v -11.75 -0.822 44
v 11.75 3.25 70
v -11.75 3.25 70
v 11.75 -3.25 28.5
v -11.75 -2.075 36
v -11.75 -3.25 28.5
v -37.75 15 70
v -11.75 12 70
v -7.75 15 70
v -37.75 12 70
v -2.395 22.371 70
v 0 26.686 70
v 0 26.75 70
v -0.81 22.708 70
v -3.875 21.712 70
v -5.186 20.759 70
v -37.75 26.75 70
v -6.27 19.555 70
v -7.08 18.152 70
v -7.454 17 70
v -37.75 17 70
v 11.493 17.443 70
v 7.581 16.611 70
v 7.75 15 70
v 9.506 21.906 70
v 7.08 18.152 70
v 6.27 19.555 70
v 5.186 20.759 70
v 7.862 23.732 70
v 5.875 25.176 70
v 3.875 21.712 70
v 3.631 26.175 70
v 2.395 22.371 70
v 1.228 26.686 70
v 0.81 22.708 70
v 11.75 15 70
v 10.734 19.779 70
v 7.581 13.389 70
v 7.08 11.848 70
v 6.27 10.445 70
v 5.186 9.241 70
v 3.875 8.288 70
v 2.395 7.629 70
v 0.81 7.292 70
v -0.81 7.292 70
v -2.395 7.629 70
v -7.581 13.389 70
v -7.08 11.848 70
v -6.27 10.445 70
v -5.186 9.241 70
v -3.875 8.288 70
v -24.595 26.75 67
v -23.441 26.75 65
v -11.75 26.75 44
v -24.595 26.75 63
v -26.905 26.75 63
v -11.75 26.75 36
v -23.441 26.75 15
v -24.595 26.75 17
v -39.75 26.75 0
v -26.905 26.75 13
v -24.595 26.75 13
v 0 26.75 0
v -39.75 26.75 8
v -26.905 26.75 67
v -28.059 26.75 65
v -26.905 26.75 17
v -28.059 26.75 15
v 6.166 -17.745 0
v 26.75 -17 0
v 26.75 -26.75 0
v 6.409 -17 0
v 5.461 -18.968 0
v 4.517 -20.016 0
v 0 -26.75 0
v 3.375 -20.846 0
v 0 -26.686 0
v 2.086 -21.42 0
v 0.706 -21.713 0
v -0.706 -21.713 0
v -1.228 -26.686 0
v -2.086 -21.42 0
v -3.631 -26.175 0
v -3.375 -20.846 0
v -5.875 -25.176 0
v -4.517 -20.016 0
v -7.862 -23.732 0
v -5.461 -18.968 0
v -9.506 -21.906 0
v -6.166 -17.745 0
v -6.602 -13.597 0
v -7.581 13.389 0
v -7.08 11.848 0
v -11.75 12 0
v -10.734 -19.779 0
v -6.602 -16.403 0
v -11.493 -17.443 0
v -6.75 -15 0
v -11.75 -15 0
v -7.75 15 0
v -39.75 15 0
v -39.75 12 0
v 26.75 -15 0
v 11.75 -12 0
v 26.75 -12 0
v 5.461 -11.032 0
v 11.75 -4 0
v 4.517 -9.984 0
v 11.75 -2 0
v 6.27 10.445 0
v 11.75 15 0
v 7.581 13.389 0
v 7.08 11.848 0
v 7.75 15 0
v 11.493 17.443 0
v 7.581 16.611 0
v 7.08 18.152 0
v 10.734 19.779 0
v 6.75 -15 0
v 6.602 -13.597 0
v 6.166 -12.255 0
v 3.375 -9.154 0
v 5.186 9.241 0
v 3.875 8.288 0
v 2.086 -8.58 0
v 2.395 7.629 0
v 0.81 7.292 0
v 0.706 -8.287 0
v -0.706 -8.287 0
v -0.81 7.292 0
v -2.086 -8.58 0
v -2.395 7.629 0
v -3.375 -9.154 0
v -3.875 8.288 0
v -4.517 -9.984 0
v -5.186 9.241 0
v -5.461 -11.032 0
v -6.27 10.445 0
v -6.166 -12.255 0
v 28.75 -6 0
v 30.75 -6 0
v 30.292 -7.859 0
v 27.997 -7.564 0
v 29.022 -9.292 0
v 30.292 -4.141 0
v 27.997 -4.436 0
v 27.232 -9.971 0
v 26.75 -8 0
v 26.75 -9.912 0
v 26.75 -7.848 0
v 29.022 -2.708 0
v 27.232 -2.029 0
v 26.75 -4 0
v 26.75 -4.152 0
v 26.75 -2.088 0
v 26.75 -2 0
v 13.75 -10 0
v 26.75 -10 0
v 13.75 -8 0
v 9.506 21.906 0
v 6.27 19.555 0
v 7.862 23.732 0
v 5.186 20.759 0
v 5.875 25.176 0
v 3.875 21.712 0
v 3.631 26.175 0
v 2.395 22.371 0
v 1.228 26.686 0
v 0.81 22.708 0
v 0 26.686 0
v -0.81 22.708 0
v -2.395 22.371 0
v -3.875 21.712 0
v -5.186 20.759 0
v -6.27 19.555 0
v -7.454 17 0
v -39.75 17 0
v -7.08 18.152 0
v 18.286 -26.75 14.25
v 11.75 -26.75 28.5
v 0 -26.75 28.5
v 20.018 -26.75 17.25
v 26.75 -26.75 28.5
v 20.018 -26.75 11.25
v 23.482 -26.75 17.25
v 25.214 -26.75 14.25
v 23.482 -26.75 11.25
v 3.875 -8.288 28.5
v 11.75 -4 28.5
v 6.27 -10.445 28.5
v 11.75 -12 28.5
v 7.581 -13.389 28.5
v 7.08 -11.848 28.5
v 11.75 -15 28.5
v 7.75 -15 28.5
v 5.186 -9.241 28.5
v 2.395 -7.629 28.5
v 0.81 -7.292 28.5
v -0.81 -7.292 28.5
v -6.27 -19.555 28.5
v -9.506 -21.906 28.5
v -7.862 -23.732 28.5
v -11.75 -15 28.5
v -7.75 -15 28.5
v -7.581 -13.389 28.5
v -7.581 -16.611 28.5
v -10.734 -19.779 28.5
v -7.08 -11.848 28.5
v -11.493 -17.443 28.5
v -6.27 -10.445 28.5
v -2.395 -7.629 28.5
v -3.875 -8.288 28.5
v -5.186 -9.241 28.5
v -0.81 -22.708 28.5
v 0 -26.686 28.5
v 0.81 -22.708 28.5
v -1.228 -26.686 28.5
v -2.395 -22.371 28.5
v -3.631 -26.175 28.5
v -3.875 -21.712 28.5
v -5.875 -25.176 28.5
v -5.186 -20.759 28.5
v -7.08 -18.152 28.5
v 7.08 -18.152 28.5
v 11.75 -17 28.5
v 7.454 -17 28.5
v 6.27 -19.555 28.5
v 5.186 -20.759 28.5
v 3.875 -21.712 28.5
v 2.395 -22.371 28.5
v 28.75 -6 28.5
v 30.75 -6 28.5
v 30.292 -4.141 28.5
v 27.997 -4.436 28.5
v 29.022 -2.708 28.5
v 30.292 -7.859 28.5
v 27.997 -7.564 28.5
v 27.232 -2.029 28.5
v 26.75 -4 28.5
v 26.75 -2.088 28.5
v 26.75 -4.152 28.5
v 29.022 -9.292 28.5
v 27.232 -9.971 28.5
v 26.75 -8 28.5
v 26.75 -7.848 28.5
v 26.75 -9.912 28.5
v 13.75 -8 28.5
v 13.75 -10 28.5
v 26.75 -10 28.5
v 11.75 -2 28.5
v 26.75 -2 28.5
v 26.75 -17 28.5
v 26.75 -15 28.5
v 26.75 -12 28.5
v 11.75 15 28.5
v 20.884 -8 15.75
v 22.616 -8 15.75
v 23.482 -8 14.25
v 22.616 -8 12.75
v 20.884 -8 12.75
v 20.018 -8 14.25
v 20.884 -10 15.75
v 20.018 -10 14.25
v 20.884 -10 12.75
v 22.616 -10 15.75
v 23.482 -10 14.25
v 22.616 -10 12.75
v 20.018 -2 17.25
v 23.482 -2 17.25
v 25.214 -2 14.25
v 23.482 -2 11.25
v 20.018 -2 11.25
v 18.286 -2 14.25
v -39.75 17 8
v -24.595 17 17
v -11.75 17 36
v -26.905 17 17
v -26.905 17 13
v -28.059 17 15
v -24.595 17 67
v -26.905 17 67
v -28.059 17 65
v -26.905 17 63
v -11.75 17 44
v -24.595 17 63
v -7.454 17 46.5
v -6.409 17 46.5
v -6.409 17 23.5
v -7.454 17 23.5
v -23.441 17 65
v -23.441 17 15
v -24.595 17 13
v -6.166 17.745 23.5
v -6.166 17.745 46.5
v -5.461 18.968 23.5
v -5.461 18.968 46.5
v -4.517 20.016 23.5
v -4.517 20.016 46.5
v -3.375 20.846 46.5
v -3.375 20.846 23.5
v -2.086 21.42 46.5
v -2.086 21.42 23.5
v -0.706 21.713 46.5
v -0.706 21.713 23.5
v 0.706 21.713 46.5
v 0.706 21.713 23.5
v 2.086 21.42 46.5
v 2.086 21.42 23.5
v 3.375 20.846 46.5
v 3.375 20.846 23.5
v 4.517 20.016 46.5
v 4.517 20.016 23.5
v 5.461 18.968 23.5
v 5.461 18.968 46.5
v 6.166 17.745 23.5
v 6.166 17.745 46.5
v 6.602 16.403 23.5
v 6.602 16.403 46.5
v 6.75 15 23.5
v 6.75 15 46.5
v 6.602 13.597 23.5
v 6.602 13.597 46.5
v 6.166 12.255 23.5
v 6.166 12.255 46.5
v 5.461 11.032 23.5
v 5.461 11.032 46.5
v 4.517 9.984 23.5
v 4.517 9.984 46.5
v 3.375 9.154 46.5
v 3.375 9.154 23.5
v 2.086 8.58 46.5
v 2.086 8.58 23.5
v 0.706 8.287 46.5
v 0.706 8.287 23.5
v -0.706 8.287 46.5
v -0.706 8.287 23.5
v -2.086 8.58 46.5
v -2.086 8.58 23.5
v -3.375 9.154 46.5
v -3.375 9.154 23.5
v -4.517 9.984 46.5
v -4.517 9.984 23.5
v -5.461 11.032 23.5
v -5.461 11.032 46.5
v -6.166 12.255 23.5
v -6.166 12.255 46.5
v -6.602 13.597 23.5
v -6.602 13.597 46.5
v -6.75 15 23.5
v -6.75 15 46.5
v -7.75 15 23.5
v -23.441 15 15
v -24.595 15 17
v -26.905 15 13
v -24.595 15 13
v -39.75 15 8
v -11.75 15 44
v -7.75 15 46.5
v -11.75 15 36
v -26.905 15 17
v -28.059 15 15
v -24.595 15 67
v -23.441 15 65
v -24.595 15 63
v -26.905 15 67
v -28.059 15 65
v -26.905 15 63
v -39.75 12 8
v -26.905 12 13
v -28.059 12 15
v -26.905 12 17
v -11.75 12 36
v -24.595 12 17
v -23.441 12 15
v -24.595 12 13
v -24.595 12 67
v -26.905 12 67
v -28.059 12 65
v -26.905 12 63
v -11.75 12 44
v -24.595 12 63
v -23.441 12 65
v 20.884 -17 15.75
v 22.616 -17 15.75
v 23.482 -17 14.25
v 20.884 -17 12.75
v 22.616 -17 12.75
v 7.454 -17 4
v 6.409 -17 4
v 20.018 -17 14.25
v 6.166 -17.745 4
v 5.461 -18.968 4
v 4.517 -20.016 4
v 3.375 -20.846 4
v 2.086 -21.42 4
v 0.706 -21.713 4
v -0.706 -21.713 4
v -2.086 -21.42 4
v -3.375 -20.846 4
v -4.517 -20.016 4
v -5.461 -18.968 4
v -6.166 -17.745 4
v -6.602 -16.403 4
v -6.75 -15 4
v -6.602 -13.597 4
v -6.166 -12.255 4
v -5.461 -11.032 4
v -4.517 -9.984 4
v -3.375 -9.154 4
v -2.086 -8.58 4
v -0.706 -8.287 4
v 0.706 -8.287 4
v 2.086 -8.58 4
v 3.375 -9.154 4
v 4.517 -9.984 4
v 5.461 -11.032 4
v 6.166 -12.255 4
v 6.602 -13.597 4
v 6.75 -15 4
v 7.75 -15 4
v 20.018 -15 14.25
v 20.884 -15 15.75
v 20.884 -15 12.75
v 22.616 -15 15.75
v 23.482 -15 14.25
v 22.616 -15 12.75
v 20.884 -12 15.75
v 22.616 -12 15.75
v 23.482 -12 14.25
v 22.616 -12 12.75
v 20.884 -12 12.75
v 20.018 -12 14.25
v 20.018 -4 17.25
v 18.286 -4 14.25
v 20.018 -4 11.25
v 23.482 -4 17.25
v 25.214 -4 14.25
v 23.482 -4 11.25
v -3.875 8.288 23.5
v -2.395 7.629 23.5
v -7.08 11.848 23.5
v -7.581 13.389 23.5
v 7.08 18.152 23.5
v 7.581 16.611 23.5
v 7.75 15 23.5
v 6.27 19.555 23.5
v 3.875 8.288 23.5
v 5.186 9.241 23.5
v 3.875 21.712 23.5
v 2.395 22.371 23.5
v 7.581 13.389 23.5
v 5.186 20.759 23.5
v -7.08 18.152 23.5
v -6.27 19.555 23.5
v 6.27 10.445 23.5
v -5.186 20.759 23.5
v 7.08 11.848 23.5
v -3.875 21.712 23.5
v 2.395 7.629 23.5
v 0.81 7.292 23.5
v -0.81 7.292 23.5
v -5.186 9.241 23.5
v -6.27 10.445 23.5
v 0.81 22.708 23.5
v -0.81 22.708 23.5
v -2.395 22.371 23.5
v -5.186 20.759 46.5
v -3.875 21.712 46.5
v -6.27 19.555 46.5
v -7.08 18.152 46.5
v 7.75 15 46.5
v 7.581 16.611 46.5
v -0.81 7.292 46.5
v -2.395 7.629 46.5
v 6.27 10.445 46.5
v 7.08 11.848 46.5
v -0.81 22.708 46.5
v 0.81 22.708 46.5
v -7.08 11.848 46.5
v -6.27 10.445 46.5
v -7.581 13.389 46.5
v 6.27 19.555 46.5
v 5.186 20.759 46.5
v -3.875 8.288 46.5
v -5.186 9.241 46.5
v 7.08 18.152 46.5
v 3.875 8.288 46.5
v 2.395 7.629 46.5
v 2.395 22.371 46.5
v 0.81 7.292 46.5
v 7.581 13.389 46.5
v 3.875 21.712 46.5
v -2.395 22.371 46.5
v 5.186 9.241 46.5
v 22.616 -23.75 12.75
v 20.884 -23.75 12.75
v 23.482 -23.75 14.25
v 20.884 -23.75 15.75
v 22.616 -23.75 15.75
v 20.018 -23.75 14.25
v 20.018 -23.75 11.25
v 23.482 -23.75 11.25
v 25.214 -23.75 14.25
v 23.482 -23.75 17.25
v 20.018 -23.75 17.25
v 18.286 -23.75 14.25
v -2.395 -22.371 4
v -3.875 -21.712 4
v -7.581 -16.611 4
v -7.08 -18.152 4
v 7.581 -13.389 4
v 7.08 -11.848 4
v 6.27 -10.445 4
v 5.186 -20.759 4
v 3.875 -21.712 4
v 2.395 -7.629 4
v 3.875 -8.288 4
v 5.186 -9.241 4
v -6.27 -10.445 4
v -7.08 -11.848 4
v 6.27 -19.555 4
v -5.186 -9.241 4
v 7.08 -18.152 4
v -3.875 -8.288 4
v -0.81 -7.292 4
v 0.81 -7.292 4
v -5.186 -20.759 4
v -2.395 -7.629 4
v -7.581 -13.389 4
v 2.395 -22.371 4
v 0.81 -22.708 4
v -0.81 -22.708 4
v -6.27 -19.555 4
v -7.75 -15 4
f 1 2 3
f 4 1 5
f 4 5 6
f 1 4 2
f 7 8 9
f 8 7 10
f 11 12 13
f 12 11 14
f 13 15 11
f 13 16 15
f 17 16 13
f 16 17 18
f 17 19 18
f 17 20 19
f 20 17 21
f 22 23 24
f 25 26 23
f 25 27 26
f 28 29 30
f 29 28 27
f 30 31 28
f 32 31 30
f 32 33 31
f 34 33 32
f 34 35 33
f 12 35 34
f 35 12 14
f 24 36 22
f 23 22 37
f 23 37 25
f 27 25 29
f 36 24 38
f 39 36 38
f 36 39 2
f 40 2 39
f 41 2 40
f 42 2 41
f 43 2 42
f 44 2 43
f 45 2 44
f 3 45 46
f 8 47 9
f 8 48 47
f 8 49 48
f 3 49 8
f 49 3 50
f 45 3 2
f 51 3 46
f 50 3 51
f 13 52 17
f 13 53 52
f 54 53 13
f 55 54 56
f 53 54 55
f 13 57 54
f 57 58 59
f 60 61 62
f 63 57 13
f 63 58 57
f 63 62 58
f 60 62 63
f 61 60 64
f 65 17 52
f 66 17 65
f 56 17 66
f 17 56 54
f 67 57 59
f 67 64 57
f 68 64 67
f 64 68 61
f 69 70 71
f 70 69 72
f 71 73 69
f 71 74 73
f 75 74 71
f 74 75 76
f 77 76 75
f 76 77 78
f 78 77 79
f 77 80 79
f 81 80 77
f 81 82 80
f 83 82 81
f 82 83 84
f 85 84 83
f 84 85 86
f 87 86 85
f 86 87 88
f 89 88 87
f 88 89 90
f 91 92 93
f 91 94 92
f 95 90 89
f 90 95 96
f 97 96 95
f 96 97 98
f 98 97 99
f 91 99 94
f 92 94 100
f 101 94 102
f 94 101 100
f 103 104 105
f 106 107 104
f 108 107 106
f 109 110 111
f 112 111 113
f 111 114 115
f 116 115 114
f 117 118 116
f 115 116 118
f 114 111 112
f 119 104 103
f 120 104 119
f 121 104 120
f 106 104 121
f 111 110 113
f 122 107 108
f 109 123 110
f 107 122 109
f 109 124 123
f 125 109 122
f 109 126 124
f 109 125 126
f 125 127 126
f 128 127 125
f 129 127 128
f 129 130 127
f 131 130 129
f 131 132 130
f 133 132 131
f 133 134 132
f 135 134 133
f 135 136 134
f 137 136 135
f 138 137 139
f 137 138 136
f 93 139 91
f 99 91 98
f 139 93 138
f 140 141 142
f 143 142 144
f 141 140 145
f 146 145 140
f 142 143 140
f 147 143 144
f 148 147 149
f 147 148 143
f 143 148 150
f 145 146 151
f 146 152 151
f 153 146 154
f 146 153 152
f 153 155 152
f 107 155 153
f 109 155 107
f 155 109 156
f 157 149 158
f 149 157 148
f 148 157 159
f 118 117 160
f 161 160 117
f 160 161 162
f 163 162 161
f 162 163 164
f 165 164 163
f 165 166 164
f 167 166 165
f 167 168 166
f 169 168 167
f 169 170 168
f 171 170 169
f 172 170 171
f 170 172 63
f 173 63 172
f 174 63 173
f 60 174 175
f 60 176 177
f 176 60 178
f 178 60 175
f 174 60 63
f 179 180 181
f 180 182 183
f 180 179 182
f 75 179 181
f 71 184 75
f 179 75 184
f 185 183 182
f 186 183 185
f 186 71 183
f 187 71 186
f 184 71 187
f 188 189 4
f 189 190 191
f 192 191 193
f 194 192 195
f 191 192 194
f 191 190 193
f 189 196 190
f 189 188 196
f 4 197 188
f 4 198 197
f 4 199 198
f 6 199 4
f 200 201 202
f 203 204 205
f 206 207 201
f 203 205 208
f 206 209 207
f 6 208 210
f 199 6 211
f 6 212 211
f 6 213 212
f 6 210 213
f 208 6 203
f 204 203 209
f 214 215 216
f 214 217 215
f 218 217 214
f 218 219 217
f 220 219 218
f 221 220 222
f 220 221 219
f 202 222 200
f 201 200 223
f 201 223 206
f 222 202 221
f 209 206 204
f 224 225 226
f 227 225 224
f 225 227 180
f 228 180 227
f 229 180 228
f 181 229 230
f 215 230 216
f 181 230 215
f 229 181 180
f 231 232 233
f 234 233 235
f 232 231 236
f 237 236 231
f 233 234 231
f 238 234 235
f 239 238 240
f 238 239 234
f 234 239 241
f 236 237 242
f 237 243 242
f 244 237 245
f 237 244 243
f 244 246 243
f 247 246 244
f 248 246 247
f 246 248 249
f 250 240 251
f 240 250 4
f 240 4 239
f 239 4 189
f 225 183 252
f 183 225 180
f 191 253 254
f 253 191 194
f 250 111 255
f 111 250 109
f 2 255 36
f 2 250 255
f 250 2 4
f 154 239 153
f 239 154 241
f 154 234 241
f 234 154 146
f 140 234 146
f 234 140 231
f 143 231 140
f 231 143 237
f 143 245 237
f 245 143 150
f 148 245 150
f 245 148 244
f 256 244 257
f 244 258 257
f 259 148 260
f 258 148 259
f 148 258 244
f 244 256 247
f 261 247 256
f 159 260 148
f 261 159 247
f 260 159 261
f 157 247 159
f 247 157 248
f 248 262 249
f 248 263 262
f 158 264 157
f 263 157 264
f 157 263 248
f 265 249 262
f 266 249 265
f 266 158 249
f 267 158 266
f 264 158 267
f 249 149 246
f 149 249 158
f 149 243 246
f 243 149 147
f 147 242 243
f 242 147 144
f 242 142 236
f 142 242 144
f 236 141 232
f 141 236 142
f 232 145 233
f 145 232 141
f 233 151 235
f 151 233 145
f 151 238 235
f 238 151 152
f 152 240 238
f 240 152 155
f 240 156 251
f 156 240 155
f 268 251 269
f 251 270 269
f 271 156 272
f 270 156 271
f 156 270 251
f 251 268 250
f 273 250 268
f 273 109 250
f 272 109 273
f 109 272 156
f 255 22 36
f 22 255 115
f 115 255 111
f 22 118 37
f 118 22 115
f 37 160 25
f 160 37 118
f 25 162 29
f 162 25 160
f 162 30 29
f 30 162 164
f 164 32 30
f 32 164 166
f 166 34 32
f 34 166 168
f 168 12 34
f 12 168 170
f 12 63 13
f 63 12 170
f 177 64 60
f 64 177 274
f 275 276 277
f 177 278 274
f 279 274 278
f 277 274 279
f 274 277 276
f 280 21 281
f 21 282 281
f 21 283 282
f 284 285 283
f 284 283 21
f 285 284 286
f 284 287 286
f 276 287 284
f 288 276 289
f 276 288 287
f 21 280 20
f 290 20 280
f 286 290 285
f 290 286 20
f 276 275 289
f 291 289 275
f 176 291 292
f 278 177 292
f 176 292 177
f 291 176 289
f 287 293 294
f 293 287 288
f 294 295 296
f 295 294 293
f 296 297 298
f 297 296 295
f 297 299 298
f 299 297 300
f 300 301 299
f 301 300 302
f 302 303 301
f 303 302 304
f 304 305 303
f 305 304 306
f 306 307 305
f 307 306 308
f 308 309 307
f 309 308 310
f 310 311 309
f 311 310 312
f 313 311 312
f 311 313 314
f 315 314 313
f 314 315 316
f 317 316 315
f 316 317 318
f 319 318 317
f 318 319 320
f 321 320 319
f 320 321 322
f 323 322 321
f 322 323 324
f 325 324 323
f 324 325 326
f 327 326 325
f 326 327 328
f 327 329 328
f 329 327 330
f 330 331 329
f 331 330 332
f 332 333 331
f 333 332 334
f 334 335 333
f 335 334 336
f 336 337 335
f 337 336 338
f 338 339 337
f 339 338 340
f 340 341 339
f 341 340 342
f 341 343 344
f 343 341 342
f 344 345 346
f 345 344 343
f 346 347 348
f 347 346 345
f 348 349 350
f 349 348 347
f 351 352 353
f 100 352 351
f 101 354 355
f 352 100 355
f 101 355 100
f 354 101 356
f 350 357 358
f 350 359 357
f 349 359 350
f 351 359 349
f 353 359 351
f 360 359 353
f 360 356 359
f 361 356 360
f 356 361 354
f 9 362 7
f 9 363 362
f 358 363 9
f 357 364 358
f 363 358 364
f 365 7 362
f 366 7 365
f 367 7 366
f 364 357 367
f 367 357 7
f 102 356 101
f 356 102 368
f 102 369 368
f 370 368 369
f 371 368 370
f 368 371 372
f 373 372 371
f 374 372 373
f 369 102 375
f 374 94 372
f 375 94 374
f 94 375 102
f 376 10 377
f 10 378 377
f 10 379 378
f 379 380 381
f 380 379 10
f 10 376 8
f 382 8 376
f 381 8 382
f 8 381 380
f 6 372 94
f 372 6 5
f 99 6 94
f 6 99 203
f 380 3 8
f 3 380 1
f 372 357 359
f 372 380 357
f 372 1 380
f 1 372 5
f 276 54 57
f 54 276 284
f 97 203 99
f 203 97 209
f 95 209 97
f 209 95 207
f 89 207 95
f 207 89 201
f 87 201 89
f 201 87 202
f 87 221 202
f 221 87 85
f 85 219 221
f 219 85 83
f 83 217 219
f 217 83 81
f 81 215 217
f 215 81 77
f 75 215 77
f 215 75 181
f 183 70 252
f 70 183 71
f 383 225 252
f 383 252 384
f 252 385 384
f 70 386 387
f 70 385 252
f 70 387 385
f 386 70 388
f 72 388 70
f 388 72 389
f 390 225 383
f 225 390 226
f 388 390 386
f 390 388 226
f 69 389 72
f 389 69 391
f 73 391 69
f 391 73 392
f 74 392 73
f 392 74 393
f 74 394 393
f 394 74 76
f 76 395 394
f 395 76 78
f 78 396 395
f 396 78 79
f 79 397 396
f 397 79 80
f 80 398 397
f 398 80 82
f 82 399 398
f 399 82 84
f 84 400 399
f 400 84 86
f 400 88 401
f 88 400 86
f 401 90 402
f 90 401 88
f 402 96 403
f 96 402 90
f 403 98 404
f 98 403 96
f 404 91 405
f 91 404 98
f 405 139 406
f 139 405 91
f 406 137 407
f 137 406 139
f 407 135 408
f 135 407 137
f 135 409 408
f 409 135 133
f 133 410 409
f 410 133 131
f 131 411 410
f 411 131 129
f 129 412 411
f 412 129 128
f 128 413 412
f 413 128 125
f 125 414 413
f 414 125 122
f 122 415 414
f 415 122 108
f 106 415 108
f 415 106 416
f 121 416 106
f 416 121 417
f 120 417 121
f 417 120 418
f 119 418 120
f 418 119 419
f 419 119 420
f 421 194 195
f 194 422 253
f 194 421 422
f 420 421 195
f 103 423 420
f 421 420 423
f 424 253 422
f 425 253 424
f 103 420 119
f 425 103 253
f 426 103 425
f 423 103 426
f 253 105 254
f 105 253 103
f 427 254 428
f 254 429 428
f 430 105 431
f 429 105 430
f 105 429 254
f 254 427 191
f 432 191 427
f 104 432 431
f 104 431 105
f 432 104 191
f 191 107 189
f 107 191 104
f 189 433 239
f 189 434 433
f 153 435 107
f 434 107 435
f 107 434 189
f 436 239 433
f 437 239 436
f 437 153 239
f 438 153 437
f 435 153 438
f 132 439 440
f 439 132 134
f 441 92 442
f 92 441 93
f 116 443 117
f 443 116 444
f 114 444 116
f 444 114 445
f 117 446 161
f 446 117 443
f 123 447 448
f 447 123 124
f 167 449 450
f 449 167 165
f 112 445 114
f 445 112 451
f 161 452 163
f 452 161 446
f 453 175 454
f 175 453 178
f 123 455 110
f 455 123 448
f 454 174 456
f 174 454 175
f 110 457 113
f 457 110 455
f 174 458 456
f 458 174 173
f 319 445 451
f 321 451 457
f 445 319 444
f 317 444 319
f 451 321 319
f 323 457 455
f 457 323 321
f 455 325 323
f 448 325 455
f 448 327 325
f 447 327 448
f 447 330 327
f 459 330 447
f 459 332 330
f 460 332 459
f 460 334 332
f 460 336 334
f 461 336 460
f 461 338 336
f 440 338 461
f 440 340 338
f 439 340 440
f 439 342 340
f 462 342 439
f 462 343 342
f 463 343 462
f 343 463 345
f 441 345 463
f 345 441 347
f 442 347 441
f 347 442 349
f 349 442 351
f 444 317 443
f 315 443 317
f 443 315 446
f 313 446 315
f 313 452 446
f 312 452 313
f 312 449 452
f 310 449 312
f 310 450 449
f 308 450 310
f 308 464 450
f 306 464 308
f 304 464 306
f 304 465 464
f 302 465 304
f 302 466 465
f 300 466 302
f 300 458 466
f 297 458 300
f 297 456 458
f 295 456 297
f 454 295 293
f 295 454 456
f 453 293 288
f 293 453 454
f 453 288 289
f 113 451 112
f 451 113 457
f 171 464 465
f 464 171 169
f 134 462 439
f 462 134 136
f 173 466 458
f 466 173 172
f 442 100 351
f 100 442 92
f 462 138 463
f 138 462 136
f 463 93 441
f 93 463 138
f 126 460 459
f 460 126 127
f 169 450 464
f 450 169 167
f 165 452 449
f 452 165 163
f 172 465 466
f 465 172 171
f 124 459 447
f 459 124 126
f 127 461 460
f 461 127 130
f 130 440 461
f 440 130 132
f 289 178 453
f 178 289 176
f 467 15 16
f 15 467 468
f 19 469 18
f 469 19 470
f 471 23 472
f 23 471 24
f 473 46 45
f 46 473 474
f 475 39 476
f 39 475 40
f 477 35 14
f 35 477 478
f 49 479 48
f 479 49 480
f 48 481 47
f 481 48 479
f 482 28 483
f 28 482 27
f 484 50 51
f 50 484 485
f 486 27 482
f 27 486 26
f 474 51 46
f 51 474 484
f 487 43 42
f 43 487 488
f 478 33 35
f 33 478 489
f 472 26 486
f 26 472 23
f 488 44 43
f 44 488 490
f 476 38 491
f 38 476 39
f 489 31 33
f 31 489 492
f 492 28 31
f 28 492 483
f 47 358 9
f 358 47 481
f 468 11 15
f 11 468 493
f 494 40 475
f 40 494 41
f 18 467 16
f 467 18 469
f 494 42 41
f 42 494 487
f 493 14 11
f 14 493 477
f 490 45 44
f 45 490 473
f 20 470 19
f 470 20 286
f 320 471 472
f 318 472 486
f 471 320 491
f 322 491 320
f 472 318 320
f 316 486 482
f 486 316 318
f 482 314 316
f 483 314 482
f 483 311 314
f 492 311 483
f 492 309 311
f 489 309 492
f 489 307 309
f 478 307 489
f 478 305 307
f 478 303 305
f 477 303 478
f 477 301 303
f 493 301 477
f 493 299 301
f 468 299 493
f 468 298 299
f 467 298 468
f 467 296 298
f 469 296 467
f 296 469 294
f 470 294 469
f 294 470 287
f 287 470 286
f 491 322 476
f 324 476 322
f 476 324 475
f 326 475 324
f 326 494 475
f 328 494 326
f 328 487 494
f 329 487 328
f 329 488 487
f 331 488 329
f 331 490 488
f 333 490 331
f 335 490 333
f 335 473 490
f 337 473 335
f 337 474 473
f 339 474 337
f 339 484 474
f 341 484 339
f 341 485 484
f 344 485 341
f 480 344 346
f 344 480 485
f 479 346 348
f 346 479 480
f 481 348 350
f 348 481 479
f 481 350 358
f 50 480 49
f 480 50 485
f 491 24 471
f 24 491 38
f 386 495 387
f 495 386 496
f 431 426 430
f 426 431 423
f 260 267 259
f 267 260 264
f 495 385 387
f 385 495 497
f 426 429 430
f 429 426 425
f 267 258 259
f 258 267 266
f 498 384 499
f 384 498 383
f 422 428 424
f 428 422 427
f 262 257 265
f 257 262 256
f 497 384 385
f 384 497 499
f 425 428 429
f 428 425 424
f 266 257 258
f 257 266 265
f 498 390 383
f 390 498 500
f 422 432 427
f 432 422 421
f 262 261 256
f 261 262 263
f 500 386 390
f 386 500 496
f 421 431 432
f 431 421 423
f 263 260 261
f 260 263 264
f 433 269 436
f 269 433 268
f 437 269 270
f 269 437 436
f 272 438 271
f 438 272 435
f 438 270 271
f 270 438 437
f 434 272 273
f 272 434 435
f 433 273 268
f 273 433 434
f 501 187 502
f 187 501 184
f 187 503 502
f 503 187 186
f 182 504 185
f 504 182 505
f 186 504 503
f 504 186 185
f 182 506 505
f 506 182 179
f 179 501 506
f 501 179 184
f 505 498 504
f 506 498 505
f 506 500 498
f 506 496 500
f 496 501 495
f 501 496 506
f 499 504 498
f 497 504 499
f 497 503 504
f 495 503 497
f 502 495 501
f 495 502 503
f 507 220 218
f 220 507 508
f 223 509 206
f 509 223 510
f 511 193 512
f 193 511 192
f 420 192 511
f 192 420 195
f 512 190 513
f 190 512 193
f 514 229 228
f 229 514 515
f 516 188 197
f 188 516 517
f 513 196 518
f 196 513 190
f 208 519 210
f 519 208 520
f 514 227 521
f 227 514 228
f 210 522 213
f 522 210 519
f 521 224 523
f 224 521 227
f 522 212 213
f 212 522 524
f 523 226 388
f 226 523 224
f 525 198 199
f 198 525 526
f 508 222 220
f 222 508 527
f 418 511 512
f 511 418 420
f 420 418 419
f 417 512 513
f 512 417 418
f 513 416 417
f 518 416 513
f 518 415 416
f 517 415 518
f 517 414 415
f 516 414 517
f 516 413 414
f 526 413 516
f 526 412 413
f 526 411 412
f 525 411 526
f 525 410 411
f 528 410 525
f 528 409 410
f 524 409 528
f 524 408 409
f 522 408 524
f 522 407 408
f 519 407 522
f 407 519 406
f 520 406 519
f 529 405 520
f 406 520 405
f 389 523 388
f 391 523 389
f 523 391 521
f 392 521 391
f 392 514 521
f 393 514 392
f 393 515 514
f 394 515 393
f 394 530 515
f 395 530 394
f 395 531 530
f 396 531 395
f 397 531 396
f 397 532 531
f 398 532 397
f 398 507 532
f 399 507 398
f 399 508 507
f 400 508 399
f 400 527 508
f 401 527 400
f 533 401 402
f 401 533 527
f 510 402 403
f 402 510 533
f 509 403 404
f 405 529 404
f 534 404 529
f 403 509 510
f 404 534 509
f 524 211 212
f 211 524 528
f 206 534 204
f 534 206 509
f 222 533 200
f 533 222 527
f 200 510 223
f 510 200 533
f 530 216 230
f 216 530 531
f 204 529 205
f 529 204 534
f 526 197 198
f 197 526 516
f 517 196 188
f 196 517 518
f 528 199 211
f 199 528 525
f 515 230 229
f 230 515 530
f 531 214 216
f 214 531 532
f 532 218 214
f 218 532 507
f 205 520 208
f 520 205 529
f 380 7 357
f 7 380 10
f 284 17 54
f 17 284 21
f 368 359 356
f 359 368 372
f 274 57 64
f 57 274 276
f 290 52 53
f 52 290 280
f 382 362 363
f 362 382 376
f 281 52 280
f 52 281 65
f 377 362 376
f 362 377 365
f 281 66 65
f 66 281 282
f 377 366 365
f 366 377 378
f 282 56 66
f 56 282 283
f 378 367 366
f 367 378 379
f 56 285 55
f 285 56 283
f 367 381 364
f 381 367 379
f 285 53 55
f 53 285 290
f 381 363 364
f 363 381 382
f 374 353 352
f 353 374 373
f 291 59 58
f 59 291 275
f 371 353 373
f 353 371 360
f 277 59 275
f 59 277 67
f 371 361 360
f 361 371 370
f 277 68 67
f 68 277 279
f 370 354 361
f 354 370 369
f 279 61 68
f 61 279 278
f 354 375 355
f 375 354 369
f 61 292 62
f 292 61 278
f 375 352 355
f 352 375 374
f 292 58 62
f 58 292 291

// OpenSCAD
// file: wallace.scad
rod_size = 8;
rod_nut_size = 15; //12 for M6, 15 for M8
bearing_size = 15.5; //12.5 for LM6UU, 15.5 for LM8UU,LM8SUU
bearing_length = 24.5; //19.5 for LM6UU, 17.5 for LM8SUU, 24.5 for LM8UU
yz_motor_distance = 25;
motor_screw_spacing = 31; //26 for NEMA14, 31 for NEMA17
motor_casing = 45; //38 for NEMA14, 45 for NEMA17
end_height = 55; //measure the height of your motor casing and add 4mm. Suggestion: 40 for NEMA14, 55 for NEMA17
bed_mount_height = 16;
//x_rod_spacing = motor_screw_spacing + 3 + rod_size;
x_rod_spacing = 30;
x_carriage_width = 70;
carriage_extruder_offset = 5;
pulley_size = 20;
idler_pulley_width = 10;
gusset_size = 15;
m3_size = 3;
m3_nut_size = 6;
m4_size = 4;
motor_shaft_size = 5;
// ratio for converting diameter to apothem
da6 = 1 / cos(180 / 6) / 2;
da8 = 1 / cos(180 / 8) / 2;
// main file
include <wallace.scad>;

difference() {
	intersection() {
		linear_extrude(height = x_carriage_width, convexity = 5) difference() {
			union() {
				square([bearing_size + 8, x_rod_spacing], center = true);
				translate([0, -x_rod_spacing / 2 - bearing_size / 2 - 4, 0]) square([bearing_size / 2 + 4 + 15, x_rod_spacing / 2 + bearing_size / 2 + 4 - 2 - pulley_size / 2]);
				translate([0, -pulley_size / 2, 0]) {
					square([bearing_size / 2 + 4 + 15, 8]);
					translate([bearing_size / 2 + 4 + 15, 4, 0]) circle(4);
				}
				rotate(180) translate([0, -x_rod_spacing / 2 - bearing_size / 2 - 4, 0]) square([bearing_size / 2 + 4 + 28, bearing_size / 2 + 4 + 3]);
				for(side = [1, -1]) translate([0, side * x_rod_spacing / 2, 0]) circle(bearing_size / 2 + 4, $fn = 30);
			}
			translate([bearing_size / 2 + 4, 2 - pulley_size / 2, 0]) {
				square([15, 4]);
				translate([0, -3, 0]) square([2, 4]);
				translate([15, 2, 0]) circle(2);
			}
			for(side = [1, -1]) translate([0, side * x_rod_spacing / 2, 0]) {
				circle(bearing_size / 2 -1, $fn = 30);
				rotate(90 * side) square([2, bearing_size / 2 + 40]);
			}
		}
		difference() {
			rotate([0, -90, 0]) linear_extrude(height = bearing_size + 100, convexity = 5, center = true) difference() {
				polygon([
					[
						0,
						(x_rod_spacing / 2 + bearing_size / 2 + 4)
					],[
						0,
						-(x_rod_spacing / 2 + bearing_size / 2 + 4)
					],[
						bearing_length + 4,
						-(x_rod_spacing / 2 + bearing_size / 2 + 4)
					],[
						bearing_length + 4,
						-(x_rod_spacing / 2 - bearing_size / 2 - 4)
					],[
						x_carriage_width,
						(x_rod_spacing / 2 - bearing_size / 2 - 4)
					],[
						x_carriage_width,
						(x_rod_spacing / 2 + bearing_size / 2 + 4)
					]
				]);
			}
			translate([bearing_size / 2 + 4, -50, bearing_length + 4]) cube(100);
		}
	}
	// linear bearings
	translate([0, x_rod_spacing / 2, 0]) rotate([0, 0, 0]) {
		%translate([0, 0, 20]) rotate(180 / 8) cylinder(r = rod_size * da8, h = 200, center = true, $fn = 8);
		for(end = [0, 1]) mirror([0, 0, end]) translate([0, 0, end * -x_carriage_width - 1]) cylinder(r = bearing_size / 2, h = bearing_length, $fn = 30);
	}
	translate([0, -x_rod_spacing / 2, 0]) rotate([0, 0, 0]) {
		translate([0, 0, 4]) cylinder(r = bearing_size / 2, h = x_carriage_width + 1, center = false, $fn = 30);
		%translate([0, 0,20]) rotate(180 / 8) cylinder(r = rod_size * da8, h = 200, center = true, $fn = 8);
	}
	// screw holes
	translate([bearing_size / 2 + 4 + 10, 5 - pulley_size / 2, bearing_length / 2 + 2]) rotate([90, 0, 0]) {
		cylinder(r = m3_size * da6, h = x_rod_spacing + bearing_size + 10, center = true, $fn = 6);
		rotate([180, 0, 0]) cylinder(r = m3_size * da6 * 2, h = x_rod_spacing + bearing_size + 10, center = false, $fn = 6);
		translate([0, 0, x_rod_spacing / 2 + bearing_size / 2 + 6 - pulley_size / 2]) cylinder(r = m3_nut_size * da6, h = x_rod_spacing + bearing_size + 10, center = false, $fn = 6);
	}
	//#for(side = [1, -1]) translate([-bearing_size / 2 - 4 - 14, 0, x_carriage_width / 2 + carriage_extruder_offset + side * 25]) rotate([90, 0, 0]) cylinder(r = 4.1, h = x_rod_spacing - 10, center = true, $fn = 6);
	translate([-bearing_size / 2 - 4 - 14, 0, x_carriage_width / 2 + carriage_extruder_offset]) rotate([90, 0, 0]) linear_extrude(height = bearing_size + x_rod_spacing + 10, center = true, convexity = 5) {
		*translate([-14, 0, 0]) {
			circle(20);
			rotate(45) square(5);
		}
		intersection() {
			translate([18, 0, 0]) rotate(135) square(100);
			translate([-14, 0, 0]) square([56, 100], center = true);
		}
		for(side = [1, -1]) translate([0, side * 25, 0]) circle(m4_size * da6, $fn = 6);
	}
}
